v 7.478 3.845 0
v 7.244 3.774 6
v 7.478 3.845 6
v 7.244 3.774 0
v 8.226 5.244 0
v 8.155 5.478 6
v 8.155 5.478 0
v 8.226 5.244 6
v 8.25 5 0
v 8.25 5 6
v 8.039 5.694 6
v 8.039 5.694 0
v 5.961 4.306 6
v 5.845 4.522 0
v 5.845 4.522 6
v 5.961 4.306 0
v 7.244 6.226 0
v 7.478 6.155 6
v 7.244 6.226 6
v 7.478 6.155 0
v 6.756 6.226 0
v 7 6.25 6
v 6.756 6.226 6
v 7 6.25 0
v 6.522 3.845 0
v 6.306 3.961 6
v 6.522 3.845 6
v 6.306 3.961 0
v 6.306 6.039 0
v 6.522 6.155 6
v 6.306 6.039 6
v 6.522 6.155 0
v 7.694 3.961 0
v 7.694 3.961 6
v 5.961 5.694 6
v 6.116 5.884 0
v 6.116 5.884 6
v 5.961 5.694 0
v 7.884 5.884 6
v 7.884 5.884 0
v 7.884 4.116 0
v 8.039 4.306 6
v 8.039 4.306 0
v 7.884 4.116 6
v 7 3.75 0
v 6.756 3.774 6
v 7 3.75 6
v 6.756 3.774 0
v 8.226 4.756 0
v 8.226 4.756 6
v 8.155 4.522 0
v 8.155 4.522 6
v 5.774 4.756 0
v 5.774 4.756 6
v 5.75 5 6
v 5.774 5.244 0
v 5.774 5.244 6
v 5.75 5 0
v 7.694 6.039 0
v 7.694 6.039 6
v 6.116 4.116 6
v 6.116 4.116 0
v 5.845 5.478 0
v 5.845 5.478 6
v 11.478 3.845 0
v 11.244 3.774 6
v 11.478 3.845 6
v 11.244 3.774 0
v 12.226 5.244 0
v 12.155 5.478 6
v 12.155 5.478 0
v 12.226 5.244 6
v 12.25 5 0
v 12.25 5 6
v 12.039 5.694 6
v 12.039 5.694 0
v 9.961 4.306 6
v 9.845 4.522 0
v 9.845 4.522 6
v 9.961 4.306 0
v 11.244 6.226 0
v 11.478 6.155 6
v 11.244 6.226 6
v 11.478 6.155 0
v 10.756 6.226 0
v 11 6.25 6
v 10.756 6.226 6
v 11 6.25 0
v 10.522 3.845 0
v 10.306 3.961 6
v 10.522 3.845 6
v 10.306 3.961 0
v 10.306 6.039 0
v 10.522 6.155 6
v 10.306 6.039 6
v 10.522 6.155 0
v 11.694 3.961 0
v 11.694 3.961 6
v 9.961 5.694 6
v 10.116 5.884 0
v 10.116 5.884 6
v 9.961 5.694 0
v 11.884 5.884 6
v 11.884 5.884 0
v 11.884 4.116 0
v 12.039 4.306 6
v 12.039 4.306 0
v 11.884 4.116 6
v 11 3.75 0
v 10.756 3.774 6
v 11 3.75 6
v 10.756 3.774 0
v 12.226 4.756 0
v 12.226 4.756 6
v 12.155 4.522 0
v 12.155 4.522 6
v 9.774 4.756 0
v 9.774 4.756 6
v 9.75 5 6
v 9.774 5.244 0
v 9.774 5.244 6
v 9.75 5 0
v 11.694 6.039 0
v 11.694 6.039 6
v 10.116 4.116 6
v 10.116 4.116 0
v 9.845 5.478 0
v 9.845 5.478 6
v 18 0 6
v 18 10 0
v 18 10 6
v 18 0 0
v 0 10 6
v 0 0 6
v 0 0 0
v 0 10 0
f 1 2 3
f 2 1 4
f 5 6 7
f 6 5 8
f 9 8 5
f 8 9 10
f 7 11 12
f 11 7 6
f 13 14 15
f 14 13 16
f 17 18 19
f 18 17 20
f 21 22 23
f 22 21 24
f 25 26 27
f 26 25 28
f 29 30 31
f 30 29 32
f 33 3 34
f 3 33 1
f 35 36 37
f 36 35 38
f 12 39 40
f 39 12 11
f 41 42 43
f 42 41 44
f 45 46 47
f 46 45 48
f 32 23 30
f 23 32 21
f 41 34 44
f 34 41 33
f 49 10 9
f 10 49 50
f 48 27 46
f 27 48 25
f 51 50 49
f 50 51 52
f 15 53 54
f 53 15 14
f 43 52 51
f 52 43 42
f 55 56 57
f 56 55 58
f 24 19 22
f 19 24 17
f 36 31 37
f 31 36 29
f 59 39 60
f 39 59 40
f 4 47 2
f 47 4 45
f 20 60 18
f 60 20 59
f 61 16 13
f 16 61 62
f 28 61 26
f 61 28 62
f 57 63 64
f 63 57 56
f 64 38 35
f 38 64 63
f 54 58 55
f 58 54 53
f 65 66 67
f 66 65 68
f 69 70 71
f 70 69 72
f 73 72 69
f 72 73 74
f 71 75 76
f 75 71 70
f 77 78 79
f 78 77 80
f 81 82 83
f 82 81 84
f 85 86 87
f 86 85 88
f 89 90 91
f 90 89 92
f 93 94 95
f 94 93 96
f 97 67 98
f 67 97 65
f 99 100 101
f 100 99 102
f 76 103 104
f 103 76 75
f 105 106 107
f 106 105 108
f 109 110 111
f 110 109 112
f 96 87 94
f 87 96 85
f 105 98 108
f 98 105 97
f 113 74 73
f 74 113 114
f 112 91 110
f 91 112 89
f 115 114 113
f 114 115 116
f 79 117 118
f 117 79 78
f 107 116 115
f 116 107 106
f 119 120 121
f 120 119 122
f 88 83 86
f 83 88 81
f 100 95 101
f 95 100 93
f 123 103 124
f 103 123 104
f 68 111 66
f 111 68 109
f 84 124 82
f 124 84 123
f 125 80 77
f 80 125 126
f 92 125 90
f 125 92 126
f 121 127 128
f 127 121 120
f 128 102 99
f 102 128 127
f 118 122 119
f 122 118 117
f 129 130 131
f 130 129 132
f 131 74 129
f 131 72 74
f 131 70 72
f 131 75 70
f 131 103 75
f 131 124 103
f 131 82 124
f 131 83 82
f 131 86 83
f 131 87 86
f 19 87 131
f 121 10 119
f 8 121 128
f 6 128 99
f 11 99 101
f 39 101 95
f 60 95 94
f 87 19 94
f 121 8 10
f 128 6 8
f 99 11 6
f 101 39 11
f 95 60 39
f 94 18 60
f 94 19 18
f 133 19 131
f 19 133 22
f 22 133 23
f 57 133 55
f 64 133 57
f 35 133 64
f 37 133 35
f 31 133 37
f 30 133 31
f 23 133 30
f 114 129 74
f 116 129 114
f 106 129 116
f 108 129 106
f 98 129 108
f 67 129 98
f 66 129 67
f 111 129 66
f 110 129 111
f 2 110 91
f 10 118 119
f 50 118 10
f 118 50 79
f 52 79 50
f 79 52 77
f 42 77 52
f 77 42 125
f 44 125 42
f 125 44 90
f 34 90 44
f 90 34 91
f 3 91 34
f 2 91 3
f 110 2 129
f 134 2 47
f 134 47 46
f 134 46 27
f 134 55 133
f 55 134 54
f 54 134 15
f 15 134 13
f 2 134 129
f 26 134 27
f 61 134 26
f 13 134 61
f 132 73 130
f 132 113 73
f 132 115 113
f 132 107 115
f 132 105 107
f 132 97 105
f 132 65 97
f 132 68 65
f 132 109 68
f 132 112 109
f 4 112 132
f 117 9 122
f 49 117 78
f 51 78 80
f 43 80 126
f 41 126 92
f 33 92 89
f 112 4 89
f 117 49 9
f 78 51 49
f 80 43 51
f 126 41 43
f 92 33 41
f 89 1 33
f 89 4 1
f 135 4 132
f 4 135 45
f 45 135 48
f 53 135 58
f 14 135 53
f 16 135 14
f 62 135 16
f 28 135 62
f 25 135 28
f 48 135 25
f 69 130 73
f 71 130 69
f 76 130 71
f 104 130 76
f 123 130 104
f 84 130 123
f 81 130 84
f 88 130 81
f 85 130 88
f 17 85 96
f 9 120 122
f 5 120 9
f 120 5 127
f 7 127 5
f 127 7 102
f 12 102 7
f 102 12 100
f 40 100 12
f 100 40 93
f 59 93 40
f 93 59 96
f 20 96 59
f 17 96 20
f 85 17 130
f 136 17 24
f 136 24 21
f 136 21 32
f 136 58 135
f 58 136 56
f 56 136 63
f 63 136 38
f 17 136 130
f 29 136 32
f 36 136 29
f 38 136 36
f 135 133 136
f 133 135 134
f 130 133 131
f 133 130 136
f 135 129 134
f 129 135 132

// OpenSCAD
$fn = 32;

// ----------------------------------------------------------------------
// Micro pad: two-hole pad, 5-20 mm class
// ----------------------------------------------------------------------

// --- parameters (mm) ---
pad_l = 18;               // pad length, X
pad_w = 10;               // pad width, Y
pad_t = 6;                // pad thickness, Z
hole_d = 2.5;             // hole diameter
hole_x = 7;               // X of the first hole centre

difference() {
  cube([pad_l, pad_w, pad_t]);
  for (x = [hole_x, pad_l - hole_x])
    translate([x, pad_w / 2, -1])
      cylinder(h = pad_t + 2, d = hole_d);
}
